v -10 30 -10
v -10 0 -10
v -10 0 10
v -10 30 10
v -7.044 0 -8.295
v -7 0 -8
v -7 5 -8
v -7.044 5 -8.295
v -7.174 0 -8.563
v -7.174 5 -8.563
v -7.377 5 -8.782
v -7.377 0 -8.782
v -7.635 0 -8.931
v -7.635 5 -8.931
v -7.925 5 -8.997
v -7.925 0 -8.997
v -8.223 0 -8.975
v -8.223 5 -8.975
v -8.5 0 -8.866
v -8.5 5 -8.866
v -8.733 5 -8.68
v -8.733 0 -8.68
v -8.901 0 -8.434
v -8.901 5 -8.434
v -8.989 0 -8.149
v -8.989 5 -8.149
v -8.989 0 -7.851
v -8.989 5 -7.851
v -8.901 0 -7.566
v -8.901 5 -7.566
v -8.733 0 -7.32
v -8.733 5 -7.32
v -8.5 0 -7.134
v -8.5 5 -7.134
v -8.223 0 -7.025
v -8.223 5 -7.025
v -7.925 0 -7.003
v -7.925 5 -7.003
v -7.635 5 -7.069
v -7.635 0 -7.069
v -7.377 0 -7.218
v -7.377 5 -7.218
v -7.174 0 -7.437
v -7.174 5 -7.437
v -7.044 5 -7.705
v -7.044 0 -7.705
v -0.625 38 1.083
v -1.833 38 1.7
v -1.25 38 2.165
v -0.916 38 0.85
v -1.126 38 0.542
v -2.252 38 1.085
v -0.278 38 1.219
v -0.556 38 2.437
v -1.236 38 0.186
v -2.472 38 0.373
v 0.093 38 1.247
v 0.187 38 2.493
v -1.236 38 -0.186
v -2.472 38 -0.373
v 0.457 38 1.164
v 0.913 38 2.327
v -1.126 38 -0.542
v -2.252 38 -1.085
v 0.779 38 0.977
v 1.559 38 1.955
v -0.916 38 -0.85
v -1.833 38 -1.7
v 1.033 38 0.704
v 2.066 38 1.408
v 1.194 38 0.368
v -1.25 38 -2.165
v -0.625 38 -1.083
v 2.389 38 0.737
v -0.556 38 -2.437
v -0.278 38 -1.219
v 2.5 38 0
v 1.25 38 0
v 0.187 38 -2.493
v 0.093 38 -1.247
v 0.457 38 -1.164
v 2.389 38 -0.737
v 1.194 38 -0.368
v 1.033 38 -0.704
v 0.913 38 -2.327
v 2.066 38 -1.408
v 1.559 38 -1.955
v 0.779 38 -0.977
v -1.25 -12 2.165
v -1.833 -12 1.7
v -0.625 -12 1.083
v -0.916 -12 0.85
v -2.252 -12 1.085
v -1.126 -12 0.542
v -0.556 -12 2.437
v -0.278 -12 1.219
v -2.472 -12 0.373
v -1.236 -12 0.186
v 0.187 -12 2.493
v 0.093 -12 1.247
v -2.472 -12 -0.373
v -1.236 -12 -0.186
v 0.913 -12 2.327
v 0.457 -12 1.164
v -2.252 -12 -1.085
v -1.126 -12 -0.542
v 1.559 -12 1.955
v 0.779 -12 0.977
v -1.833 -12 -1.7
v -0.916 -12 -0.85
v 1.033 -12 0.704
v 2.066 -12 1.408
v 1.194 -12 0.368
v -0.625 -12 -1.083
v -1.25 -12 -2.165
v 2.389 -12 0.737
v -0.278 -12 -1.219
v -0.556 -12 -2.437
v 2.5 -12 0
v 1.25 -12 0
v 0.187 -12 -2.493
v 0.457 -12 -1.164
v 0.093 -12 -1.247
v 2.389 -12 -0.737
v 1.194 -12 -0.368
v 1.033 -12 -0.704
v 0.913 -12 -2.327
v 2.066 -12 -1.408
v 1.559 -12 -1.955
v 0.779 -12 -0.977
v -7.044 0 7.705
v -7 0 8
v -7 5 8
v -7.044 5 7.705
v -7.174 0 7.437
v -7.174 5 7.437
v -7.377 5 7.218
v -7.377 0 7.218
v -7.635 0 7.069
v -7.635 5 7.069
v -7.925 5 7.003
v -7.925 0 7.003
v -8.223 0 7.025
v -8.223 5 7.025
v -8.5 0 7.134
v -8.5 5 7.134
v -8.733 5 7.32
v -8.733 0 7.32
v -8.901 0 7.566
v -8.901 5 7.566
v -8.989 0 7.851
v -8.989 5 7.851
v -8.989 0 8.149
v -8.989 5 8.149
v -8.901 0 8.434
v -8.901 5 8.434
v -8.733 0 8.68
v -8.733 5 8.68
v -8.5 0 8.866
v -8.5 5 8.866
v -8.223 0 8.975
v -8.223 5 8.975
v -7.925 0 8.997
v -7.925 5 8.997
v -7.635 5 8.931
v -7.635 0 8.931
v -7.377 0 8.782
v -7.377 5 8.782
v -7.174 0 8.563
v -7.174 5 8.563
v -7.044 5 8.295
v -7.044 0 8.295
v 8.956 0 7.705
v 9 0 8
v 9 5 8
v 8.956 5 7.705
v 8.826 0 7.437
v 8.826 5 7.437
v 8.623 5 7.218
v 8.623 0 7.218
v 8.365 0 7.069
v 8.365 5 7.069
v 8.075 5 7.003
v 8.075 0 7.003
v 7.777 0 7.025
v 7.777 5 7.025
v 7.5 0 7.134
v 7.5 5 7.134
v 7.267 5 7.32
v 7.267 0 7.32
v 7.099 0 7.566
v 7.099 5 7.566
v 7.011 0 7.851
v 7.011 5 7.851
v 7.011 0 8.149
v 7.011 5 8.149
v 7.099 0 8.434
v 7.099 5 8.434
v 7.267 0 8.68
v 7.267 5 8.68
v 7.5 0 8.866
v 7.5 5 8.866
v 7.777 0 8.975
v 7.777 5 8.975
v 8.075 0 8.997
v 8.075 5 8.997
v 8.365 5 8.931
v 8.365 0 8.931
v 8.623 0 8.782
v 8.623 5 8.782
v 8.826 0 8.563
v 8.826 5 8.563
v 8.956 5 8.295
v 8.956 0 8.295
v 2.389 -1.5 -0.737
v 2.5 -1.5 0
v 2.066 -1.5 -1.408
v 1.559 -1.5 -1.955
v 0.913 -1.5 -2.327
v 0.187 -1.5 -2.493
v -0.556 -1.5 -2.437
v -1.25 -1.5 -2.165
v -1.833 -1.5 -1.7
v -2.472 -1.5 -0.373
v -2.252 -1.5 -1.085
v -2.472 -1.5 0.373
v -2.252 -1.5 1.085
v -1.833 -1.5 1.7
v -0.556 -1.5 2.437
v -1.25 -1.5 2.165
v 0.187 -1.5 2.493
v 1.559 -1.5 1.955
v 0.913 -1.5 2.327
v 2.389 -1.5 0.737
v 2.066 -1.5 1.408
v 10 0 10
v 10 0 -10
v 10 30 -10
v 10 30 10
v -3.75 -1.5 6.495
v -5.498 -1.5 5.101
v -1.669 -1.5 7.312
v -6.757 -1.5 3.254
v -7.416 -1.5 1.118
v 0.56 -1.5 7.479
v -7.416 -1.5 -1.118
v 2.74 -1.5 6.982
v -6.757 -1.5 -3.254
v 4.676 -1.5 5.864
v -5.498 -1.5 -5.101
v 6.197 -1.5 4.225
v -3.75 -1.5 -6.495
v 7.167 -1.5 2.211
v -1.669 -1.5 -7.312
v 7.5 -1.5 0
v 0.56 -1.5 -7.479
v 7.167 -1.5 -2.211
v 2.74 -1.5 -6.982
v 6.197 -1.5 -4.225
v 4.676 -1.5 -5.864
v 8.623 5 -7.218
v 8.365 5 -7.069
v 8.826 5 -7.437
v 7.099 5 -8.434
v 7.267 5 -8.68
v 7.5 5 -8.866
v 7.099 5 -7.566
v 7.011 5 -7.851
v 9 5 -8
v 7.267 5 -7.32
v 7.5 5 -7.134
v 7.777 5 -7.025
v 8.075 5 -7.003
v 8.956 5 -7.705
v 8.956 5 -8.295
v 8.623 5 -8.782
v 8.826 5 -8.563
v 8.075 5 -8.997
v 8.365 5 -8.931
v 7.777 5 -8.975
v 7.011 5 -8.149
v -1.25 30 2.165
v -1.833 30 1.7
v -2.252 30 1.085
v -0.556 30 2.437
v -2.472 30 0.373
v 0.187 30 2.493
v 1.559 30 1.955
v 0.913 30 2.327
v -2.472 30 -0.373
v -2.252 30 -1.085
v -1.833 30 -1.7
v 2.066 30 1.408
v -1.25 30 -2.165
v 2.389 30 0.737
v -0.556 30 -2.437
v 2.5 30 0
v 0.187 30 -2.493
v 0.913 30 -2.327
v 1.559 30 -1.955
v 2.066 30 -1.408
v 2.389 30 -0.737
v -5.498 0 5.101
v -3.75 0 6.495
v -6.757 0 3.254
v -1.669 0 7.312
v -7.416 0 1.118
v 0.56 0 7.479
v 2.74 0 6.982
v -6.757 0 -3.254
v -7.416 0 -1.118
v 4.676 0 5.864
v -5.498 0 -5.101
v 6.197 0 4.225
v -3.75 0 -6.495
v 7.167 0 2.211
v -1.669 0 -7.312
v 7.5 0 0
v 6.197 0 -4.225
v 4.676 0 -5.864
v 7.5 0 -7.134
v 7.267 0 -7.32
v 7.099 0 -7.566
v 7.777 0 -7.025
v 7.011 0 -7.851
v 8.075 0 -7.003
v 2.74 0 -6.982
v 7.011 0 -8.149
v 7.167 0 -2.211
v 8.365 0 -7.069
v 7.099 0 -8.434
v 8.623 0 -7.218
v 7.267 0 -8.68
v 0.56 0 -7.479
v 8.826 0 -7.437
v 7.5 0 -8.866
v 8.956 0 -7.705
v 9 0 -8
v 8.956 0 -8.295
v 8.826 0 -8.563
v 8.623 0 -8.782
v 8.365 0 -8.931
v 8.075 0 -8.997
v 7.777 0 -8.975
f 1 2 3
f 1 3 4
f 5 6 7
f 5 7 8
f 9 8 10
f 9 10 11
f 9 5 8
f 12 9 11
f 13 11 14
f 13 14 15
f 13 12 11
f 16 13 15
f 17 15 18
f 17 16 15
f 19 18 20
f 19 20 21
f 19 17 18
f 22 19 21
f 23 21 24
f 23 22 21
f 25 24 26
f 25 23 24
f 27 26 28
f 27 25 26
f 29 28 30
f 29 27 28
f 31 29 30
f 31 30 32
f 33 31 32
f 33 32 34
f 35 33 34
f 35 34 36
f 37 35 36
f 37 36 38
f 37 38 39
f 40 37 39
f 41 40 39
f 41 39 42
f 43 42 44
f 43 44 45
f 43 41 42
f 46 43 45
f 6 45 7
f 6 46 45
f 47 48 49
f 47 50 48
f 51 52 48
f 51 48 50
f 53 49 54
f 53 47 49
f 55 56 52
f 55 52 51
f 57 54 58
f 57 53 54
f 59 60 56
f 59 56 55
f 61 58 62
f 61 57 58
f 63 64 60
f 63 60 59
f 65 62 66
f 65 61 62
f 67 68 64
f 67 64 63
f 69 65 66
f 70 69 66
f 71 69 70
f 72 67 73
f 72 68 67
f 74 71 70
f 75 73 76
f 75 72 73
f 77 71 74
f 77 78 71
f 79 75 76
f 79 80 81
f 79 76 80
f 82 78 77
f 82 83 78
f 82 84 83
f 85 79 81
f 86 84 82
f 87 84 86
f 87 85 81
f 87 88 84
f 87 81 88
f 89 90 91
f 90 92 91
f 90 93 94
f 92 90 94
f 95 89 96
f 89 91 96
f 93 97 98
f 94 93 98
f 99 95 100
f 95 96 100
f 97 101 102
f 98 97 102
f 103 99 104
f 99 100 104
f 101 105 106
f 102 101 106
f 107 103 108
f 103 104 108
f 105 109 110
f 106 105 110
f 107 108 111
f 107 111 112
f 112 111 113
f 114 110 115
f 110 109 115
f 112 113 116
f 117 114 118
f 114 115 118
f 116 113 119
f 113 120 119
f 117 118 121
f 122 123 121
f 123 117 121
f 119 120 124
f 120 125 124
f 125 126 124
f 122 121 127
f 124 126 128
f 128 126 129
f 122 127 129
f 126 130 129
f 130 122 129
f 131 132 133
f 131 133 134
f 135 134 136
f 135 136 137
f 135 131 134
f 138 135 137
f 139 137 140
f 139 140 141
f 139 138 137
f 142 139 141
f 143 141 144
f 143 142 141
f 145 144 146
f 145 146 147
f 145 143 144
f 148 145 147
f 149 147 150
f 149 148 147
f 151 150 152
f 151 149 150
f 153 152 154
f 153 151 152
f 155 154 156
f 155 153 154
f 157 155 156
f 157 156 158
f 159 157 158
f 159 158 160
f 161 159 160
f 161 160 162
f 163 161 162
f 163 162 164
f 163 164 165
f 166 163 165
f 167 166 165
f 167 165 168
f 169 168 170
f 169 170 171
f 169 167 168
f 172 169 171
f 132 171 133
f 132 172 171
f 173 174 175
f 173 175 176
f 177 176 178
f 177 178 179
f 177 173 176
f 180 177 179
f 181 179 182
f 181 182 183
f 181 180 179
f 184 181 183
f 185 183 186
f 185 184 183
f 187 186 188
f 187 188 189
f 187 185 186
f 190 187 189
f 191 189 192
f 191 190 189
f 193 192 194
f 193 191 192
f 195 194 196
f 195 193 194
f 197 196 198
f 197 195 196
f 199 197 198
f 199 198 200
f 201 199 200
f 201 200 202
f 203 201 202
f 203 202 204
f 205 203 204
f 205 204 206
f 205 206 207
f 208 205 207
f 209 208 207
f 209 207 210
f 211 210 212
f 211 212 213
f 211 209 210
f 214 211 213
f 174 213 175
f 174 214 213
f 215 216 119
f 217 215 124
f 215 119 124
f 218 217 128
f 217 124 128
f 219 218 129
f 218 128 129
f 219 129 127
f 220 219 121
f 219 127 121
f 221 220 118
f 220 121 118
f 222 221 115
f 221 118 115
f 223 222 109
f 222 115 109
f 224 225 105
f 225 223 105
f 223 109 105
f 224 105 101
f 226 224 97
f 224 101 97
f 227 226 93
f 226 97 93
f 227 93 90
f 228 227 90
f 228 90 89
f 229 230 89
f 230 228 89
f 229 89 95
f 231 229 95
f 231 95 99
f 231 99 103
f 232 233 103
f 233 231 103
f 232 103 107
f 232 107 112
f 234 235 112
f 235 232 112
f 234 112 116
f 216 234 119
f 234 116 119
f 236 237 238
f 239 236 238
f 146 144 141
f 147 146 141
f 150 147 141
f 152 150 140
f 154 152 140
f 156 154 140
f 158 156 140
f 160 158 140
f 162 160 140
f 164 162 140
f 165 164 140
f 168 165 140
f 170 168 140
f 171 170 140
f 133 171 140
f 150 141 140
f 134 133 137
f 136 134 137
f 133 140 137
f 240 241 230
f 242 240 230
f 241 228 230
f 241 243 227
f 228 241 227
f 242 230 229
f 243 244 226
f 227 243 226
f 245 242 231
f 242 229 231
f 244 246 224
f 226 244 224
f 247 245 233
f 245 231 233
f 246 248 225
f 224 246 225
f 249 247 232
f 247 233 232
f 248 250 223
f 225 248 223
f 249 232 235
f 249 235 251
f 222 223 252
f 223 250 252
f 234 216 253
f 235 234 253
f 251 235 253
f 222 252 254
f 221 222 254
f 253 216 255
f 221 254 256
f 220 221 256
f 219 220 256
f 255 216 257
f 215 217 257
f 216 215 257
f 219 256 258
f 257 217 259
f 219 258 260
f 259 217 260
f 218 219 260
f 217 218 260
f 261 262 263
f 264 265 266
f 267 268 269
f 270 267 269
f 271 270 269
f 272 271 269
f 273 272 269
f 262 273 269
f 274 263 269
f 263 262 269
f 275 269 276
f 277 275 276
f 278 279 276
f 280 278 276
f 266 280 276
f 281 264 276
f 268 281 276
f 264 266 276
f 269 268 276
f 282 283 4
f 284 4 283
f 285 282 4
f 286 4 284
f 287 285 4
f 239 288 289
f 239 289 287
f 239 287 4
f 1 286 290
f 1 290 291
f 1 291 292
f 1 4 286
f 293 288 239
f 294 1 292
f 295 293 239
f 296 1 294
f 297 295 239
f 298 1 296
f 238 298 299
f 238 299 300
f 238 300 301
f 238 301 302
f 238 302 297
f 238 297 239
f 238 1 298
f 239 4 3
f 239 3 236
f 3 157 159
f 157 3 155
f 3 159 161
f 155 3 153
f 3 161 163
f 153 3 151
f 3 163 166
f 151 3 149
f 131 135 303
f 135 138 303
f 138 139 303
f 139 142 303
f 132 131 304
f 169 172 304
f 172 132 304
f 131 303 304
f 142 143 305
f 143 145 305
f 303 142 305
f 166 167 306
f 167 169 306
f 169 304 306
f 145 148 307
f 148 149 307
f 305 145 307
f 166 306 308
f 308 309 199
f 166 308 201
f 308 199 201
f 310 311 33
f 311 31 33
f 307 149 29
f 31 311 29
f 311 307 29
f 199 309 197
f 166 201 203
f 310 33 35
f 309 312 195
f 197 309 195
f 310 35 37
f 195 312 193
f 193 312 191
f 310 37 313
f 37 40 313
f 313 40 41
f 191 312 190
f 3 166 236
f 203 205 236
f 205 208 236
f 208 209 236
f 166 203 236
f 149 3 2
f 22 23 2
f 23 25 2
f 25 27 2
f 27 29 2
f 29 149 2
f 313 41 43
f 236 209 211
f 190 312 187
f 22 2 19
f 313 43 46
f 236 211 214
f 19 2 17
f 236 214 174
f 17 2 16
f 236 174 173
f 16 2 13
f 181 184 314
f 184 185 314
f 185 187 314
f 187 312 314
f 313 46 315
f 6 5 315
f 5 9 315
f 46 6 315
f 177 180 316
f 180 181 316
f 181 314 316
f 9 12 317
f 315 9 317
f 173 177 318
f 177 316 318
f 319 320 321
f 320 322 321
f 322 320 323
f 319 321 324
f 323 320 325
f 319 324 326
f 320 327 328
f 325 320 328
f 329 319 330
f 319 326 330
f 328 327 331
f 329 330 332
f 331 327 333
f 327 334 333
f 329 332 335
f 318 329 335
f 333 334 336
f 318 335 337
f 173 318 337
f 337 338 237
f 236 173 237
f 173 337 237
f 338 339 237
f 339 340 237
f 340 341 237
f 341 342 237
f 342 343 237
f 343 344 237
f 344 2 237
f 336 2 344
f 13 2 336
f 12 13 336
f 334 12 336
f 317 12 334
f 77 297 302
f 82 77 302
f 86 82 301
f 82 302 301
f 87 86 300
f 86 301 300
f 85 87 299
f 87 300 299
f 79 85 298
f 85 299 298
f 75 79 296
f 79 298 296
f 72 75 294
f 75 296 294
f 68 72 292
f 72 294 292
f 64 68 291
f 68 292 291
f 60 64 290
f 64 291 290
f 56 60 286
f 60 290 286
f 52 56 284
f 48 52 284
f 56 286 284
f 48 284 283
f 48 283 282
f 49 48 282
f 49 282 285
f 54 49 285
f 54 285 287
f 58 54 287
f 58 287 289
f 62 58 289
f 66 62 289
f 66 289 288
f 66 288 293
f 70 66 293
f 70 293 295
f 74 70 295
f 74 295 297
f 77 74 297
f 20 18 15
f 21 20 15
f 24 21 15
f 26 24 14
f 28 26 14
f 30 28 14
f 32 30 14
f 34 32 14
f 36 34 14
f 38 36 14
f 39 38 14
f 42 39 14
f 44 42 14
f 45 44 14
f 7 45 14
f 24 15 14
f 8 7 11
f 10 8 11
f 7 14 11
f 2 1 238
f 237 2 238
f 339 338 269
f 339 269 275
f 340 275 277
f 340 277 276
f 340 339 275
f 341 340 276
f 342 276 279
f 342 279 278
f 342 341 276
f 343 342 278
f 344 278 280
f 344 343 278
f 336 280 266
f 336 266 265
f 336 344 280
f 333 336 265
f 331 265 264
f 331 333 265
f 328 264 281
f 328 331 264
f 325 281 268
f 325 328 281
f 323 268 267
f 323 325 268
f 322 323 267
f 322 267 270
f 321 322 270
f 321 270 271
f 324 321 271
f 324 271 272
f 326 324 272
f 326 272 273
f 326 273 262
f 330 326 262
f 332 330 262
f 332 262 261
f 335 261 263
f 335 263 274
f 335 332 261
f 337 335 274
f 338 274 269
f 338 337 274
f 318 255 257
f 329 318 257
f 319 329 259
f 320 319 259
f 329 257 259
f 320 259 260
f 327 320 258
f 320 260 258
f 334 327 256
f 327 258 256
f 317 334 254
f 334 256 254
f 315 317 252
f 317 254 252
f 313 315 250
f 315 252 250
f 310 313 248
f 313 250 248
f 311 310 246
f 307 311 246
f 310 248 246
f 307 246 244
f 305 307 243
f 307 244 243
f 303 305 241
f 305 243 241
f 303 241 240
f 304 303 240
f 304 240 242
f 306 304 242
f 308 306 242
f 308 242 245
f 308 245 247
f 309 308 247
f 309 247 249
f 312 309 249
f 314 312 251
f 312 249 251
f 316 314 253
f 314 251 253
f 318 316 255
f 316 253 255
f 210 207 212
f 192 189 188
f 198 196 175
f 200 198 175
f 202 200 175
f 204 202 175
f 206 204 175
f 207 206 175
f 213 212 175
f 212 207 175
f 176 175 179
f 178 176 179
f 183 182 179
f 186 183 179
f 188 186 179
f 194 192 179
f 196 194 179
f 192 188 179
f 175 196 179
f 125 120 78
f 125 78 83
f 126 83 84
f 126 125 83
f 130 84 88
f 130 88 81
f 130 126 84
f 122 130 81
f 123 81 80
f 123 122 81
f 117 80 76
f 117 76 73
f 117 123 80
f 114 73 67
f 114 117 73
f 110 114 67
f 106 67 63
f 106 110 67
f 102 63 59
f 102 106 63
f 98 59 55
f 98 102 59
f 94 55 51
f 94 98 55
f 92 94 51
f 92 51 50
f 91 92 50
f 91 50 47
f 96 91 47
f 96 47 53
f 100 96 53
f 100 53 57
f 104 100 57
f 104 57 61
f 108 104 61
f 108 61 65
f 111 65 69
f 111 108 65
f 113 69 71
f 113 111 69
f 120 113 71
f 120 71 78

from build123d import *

# Parameters (mm, degrees)
CYLINDER002_R     = 1
CYLINDER002_DEPTH = 5
CYLINDER003_R     = 1
CYLINDER003_DEPTH = 5
CYLINDER004_R     = 1
CYLINDER004_DEPTH = 5
CYLINDER005_R     = 1.25
CYLINDER005_DEPTH = 50
CYLINDER001_R     = 1
CYLINDER001_DEPTH = 5
CYLINDER_R        = 7.5
CYLINDER_DEPTH    = 1.5
CYLINDER006_R     = 2.5
CYLINDER006_DEPTH = 50
BOX_W             = 20
BOX_H             = 30
BOX_DEPTH         = 20


with BuildPart() as cylinder002:
    # Cylinder002 → Cylinder002 (new body)
    with BuildSketch(Plane(origin=(-8, 0, 8), x_dir=(1, 0, 0), z_dir=(0, 1, 0))):
        Circle(CYLINDER002_R)
    extrude(amount=CYLINDER002_DEPTH)


with BuildPart() as cylinder003:
    # Cylinder003 → Cylinder003 (new body)
    with BuildSketch(Plane(origin=(8, 0, -8), x_dir=(1, 0, 0), z_dir=(0, 1, 0))):
        Circle(CYLINDER003_R)
    extrude(amount=CYLINDER003_DEPTH)


with BuildPart() as cylinder004:
    # Cylinder004 → Cylinder004 (new body)
    with BuildSketch(Plane(origin=(8, 0, 8), x_dir=(1, 0, 0), z_dir=(0, 1, 0))):
        Circle(CYLINDER004_R)
    extrude(amount=CYLINDER004_DEPTH)


with BuildPart() as cylinder005:
    # Cylinder005 → Cylinder005 (new body)
    with BuildSketch(Plane(origin=(0, -12, 0), x_dir=(1, 0, 0), z_dir=(0, 1, 0))):
        Circle(CYLINDER005_R)
    extrude(amount=CYLINDER005_DEPTH)


with BuildPart() as fusion002:
    # Cylinder001 → Cylinder001 (new body)
    with BuildSketch(Plane(origin=(-8, 0, -8), x_dir=(1, 0, 0), z_dir=(0, 1, 0))):
        Circle(CYLINDER001_R)
    extrude(amount=CYLINDER001_DEPTH)

    # Fusion002: union Cylinder002, Cylinder003, Cylinder004, Cylinder005
    add(cylinder002.part)
    add(cylinder003.part)
    add(cylinder004.part)
    add(cylinder005.part)


with BuildPart() as cylinder:
    # Cylinder → Cylinder (new body)
    with BuildSketch(Plane(origin=(0, -1.5, 0), x_dir=(1, 0, 0), z_dir=(0, 1, 0))):
        Circle(CYLINDER_R)
    extrude(amount=CYLINDER_DEPTH)


with BuildPart() as cylinder006:
    # Cylinder006 → Cylinder006 (new body)
    with BuildSketch(Plane(origin=(0, -12, 0), x_dir=(1, 0, 0), z_dir=(0, 1, 0))):
        Circle(CYLINDER006_R)
    extrude(amount=CYLINDER006_DEPTH)


with BuildPart() as hollowdoubleshaftstepper:
    # Box → Box (new body)
    with BuildSketch(Plane(origin=(-10, 0, -10), x_dir=(1, 0, 0), z_dir=(0, 0, 1))):
        with Locations((10, 15)):
            Rectangle(BOX_W, BOX_H)
    extrude(amount=BOX_DEPTH)

    # Fusion001: union Cylinder, Cylinder006
    add(cylinder.part)
    add(cylinder006.part)

    # Cut: cut Fusion002
    add(fusion002.part, mode=Mode.SUBTRACT)


solid = hollowdoubleshaftstepper.part
